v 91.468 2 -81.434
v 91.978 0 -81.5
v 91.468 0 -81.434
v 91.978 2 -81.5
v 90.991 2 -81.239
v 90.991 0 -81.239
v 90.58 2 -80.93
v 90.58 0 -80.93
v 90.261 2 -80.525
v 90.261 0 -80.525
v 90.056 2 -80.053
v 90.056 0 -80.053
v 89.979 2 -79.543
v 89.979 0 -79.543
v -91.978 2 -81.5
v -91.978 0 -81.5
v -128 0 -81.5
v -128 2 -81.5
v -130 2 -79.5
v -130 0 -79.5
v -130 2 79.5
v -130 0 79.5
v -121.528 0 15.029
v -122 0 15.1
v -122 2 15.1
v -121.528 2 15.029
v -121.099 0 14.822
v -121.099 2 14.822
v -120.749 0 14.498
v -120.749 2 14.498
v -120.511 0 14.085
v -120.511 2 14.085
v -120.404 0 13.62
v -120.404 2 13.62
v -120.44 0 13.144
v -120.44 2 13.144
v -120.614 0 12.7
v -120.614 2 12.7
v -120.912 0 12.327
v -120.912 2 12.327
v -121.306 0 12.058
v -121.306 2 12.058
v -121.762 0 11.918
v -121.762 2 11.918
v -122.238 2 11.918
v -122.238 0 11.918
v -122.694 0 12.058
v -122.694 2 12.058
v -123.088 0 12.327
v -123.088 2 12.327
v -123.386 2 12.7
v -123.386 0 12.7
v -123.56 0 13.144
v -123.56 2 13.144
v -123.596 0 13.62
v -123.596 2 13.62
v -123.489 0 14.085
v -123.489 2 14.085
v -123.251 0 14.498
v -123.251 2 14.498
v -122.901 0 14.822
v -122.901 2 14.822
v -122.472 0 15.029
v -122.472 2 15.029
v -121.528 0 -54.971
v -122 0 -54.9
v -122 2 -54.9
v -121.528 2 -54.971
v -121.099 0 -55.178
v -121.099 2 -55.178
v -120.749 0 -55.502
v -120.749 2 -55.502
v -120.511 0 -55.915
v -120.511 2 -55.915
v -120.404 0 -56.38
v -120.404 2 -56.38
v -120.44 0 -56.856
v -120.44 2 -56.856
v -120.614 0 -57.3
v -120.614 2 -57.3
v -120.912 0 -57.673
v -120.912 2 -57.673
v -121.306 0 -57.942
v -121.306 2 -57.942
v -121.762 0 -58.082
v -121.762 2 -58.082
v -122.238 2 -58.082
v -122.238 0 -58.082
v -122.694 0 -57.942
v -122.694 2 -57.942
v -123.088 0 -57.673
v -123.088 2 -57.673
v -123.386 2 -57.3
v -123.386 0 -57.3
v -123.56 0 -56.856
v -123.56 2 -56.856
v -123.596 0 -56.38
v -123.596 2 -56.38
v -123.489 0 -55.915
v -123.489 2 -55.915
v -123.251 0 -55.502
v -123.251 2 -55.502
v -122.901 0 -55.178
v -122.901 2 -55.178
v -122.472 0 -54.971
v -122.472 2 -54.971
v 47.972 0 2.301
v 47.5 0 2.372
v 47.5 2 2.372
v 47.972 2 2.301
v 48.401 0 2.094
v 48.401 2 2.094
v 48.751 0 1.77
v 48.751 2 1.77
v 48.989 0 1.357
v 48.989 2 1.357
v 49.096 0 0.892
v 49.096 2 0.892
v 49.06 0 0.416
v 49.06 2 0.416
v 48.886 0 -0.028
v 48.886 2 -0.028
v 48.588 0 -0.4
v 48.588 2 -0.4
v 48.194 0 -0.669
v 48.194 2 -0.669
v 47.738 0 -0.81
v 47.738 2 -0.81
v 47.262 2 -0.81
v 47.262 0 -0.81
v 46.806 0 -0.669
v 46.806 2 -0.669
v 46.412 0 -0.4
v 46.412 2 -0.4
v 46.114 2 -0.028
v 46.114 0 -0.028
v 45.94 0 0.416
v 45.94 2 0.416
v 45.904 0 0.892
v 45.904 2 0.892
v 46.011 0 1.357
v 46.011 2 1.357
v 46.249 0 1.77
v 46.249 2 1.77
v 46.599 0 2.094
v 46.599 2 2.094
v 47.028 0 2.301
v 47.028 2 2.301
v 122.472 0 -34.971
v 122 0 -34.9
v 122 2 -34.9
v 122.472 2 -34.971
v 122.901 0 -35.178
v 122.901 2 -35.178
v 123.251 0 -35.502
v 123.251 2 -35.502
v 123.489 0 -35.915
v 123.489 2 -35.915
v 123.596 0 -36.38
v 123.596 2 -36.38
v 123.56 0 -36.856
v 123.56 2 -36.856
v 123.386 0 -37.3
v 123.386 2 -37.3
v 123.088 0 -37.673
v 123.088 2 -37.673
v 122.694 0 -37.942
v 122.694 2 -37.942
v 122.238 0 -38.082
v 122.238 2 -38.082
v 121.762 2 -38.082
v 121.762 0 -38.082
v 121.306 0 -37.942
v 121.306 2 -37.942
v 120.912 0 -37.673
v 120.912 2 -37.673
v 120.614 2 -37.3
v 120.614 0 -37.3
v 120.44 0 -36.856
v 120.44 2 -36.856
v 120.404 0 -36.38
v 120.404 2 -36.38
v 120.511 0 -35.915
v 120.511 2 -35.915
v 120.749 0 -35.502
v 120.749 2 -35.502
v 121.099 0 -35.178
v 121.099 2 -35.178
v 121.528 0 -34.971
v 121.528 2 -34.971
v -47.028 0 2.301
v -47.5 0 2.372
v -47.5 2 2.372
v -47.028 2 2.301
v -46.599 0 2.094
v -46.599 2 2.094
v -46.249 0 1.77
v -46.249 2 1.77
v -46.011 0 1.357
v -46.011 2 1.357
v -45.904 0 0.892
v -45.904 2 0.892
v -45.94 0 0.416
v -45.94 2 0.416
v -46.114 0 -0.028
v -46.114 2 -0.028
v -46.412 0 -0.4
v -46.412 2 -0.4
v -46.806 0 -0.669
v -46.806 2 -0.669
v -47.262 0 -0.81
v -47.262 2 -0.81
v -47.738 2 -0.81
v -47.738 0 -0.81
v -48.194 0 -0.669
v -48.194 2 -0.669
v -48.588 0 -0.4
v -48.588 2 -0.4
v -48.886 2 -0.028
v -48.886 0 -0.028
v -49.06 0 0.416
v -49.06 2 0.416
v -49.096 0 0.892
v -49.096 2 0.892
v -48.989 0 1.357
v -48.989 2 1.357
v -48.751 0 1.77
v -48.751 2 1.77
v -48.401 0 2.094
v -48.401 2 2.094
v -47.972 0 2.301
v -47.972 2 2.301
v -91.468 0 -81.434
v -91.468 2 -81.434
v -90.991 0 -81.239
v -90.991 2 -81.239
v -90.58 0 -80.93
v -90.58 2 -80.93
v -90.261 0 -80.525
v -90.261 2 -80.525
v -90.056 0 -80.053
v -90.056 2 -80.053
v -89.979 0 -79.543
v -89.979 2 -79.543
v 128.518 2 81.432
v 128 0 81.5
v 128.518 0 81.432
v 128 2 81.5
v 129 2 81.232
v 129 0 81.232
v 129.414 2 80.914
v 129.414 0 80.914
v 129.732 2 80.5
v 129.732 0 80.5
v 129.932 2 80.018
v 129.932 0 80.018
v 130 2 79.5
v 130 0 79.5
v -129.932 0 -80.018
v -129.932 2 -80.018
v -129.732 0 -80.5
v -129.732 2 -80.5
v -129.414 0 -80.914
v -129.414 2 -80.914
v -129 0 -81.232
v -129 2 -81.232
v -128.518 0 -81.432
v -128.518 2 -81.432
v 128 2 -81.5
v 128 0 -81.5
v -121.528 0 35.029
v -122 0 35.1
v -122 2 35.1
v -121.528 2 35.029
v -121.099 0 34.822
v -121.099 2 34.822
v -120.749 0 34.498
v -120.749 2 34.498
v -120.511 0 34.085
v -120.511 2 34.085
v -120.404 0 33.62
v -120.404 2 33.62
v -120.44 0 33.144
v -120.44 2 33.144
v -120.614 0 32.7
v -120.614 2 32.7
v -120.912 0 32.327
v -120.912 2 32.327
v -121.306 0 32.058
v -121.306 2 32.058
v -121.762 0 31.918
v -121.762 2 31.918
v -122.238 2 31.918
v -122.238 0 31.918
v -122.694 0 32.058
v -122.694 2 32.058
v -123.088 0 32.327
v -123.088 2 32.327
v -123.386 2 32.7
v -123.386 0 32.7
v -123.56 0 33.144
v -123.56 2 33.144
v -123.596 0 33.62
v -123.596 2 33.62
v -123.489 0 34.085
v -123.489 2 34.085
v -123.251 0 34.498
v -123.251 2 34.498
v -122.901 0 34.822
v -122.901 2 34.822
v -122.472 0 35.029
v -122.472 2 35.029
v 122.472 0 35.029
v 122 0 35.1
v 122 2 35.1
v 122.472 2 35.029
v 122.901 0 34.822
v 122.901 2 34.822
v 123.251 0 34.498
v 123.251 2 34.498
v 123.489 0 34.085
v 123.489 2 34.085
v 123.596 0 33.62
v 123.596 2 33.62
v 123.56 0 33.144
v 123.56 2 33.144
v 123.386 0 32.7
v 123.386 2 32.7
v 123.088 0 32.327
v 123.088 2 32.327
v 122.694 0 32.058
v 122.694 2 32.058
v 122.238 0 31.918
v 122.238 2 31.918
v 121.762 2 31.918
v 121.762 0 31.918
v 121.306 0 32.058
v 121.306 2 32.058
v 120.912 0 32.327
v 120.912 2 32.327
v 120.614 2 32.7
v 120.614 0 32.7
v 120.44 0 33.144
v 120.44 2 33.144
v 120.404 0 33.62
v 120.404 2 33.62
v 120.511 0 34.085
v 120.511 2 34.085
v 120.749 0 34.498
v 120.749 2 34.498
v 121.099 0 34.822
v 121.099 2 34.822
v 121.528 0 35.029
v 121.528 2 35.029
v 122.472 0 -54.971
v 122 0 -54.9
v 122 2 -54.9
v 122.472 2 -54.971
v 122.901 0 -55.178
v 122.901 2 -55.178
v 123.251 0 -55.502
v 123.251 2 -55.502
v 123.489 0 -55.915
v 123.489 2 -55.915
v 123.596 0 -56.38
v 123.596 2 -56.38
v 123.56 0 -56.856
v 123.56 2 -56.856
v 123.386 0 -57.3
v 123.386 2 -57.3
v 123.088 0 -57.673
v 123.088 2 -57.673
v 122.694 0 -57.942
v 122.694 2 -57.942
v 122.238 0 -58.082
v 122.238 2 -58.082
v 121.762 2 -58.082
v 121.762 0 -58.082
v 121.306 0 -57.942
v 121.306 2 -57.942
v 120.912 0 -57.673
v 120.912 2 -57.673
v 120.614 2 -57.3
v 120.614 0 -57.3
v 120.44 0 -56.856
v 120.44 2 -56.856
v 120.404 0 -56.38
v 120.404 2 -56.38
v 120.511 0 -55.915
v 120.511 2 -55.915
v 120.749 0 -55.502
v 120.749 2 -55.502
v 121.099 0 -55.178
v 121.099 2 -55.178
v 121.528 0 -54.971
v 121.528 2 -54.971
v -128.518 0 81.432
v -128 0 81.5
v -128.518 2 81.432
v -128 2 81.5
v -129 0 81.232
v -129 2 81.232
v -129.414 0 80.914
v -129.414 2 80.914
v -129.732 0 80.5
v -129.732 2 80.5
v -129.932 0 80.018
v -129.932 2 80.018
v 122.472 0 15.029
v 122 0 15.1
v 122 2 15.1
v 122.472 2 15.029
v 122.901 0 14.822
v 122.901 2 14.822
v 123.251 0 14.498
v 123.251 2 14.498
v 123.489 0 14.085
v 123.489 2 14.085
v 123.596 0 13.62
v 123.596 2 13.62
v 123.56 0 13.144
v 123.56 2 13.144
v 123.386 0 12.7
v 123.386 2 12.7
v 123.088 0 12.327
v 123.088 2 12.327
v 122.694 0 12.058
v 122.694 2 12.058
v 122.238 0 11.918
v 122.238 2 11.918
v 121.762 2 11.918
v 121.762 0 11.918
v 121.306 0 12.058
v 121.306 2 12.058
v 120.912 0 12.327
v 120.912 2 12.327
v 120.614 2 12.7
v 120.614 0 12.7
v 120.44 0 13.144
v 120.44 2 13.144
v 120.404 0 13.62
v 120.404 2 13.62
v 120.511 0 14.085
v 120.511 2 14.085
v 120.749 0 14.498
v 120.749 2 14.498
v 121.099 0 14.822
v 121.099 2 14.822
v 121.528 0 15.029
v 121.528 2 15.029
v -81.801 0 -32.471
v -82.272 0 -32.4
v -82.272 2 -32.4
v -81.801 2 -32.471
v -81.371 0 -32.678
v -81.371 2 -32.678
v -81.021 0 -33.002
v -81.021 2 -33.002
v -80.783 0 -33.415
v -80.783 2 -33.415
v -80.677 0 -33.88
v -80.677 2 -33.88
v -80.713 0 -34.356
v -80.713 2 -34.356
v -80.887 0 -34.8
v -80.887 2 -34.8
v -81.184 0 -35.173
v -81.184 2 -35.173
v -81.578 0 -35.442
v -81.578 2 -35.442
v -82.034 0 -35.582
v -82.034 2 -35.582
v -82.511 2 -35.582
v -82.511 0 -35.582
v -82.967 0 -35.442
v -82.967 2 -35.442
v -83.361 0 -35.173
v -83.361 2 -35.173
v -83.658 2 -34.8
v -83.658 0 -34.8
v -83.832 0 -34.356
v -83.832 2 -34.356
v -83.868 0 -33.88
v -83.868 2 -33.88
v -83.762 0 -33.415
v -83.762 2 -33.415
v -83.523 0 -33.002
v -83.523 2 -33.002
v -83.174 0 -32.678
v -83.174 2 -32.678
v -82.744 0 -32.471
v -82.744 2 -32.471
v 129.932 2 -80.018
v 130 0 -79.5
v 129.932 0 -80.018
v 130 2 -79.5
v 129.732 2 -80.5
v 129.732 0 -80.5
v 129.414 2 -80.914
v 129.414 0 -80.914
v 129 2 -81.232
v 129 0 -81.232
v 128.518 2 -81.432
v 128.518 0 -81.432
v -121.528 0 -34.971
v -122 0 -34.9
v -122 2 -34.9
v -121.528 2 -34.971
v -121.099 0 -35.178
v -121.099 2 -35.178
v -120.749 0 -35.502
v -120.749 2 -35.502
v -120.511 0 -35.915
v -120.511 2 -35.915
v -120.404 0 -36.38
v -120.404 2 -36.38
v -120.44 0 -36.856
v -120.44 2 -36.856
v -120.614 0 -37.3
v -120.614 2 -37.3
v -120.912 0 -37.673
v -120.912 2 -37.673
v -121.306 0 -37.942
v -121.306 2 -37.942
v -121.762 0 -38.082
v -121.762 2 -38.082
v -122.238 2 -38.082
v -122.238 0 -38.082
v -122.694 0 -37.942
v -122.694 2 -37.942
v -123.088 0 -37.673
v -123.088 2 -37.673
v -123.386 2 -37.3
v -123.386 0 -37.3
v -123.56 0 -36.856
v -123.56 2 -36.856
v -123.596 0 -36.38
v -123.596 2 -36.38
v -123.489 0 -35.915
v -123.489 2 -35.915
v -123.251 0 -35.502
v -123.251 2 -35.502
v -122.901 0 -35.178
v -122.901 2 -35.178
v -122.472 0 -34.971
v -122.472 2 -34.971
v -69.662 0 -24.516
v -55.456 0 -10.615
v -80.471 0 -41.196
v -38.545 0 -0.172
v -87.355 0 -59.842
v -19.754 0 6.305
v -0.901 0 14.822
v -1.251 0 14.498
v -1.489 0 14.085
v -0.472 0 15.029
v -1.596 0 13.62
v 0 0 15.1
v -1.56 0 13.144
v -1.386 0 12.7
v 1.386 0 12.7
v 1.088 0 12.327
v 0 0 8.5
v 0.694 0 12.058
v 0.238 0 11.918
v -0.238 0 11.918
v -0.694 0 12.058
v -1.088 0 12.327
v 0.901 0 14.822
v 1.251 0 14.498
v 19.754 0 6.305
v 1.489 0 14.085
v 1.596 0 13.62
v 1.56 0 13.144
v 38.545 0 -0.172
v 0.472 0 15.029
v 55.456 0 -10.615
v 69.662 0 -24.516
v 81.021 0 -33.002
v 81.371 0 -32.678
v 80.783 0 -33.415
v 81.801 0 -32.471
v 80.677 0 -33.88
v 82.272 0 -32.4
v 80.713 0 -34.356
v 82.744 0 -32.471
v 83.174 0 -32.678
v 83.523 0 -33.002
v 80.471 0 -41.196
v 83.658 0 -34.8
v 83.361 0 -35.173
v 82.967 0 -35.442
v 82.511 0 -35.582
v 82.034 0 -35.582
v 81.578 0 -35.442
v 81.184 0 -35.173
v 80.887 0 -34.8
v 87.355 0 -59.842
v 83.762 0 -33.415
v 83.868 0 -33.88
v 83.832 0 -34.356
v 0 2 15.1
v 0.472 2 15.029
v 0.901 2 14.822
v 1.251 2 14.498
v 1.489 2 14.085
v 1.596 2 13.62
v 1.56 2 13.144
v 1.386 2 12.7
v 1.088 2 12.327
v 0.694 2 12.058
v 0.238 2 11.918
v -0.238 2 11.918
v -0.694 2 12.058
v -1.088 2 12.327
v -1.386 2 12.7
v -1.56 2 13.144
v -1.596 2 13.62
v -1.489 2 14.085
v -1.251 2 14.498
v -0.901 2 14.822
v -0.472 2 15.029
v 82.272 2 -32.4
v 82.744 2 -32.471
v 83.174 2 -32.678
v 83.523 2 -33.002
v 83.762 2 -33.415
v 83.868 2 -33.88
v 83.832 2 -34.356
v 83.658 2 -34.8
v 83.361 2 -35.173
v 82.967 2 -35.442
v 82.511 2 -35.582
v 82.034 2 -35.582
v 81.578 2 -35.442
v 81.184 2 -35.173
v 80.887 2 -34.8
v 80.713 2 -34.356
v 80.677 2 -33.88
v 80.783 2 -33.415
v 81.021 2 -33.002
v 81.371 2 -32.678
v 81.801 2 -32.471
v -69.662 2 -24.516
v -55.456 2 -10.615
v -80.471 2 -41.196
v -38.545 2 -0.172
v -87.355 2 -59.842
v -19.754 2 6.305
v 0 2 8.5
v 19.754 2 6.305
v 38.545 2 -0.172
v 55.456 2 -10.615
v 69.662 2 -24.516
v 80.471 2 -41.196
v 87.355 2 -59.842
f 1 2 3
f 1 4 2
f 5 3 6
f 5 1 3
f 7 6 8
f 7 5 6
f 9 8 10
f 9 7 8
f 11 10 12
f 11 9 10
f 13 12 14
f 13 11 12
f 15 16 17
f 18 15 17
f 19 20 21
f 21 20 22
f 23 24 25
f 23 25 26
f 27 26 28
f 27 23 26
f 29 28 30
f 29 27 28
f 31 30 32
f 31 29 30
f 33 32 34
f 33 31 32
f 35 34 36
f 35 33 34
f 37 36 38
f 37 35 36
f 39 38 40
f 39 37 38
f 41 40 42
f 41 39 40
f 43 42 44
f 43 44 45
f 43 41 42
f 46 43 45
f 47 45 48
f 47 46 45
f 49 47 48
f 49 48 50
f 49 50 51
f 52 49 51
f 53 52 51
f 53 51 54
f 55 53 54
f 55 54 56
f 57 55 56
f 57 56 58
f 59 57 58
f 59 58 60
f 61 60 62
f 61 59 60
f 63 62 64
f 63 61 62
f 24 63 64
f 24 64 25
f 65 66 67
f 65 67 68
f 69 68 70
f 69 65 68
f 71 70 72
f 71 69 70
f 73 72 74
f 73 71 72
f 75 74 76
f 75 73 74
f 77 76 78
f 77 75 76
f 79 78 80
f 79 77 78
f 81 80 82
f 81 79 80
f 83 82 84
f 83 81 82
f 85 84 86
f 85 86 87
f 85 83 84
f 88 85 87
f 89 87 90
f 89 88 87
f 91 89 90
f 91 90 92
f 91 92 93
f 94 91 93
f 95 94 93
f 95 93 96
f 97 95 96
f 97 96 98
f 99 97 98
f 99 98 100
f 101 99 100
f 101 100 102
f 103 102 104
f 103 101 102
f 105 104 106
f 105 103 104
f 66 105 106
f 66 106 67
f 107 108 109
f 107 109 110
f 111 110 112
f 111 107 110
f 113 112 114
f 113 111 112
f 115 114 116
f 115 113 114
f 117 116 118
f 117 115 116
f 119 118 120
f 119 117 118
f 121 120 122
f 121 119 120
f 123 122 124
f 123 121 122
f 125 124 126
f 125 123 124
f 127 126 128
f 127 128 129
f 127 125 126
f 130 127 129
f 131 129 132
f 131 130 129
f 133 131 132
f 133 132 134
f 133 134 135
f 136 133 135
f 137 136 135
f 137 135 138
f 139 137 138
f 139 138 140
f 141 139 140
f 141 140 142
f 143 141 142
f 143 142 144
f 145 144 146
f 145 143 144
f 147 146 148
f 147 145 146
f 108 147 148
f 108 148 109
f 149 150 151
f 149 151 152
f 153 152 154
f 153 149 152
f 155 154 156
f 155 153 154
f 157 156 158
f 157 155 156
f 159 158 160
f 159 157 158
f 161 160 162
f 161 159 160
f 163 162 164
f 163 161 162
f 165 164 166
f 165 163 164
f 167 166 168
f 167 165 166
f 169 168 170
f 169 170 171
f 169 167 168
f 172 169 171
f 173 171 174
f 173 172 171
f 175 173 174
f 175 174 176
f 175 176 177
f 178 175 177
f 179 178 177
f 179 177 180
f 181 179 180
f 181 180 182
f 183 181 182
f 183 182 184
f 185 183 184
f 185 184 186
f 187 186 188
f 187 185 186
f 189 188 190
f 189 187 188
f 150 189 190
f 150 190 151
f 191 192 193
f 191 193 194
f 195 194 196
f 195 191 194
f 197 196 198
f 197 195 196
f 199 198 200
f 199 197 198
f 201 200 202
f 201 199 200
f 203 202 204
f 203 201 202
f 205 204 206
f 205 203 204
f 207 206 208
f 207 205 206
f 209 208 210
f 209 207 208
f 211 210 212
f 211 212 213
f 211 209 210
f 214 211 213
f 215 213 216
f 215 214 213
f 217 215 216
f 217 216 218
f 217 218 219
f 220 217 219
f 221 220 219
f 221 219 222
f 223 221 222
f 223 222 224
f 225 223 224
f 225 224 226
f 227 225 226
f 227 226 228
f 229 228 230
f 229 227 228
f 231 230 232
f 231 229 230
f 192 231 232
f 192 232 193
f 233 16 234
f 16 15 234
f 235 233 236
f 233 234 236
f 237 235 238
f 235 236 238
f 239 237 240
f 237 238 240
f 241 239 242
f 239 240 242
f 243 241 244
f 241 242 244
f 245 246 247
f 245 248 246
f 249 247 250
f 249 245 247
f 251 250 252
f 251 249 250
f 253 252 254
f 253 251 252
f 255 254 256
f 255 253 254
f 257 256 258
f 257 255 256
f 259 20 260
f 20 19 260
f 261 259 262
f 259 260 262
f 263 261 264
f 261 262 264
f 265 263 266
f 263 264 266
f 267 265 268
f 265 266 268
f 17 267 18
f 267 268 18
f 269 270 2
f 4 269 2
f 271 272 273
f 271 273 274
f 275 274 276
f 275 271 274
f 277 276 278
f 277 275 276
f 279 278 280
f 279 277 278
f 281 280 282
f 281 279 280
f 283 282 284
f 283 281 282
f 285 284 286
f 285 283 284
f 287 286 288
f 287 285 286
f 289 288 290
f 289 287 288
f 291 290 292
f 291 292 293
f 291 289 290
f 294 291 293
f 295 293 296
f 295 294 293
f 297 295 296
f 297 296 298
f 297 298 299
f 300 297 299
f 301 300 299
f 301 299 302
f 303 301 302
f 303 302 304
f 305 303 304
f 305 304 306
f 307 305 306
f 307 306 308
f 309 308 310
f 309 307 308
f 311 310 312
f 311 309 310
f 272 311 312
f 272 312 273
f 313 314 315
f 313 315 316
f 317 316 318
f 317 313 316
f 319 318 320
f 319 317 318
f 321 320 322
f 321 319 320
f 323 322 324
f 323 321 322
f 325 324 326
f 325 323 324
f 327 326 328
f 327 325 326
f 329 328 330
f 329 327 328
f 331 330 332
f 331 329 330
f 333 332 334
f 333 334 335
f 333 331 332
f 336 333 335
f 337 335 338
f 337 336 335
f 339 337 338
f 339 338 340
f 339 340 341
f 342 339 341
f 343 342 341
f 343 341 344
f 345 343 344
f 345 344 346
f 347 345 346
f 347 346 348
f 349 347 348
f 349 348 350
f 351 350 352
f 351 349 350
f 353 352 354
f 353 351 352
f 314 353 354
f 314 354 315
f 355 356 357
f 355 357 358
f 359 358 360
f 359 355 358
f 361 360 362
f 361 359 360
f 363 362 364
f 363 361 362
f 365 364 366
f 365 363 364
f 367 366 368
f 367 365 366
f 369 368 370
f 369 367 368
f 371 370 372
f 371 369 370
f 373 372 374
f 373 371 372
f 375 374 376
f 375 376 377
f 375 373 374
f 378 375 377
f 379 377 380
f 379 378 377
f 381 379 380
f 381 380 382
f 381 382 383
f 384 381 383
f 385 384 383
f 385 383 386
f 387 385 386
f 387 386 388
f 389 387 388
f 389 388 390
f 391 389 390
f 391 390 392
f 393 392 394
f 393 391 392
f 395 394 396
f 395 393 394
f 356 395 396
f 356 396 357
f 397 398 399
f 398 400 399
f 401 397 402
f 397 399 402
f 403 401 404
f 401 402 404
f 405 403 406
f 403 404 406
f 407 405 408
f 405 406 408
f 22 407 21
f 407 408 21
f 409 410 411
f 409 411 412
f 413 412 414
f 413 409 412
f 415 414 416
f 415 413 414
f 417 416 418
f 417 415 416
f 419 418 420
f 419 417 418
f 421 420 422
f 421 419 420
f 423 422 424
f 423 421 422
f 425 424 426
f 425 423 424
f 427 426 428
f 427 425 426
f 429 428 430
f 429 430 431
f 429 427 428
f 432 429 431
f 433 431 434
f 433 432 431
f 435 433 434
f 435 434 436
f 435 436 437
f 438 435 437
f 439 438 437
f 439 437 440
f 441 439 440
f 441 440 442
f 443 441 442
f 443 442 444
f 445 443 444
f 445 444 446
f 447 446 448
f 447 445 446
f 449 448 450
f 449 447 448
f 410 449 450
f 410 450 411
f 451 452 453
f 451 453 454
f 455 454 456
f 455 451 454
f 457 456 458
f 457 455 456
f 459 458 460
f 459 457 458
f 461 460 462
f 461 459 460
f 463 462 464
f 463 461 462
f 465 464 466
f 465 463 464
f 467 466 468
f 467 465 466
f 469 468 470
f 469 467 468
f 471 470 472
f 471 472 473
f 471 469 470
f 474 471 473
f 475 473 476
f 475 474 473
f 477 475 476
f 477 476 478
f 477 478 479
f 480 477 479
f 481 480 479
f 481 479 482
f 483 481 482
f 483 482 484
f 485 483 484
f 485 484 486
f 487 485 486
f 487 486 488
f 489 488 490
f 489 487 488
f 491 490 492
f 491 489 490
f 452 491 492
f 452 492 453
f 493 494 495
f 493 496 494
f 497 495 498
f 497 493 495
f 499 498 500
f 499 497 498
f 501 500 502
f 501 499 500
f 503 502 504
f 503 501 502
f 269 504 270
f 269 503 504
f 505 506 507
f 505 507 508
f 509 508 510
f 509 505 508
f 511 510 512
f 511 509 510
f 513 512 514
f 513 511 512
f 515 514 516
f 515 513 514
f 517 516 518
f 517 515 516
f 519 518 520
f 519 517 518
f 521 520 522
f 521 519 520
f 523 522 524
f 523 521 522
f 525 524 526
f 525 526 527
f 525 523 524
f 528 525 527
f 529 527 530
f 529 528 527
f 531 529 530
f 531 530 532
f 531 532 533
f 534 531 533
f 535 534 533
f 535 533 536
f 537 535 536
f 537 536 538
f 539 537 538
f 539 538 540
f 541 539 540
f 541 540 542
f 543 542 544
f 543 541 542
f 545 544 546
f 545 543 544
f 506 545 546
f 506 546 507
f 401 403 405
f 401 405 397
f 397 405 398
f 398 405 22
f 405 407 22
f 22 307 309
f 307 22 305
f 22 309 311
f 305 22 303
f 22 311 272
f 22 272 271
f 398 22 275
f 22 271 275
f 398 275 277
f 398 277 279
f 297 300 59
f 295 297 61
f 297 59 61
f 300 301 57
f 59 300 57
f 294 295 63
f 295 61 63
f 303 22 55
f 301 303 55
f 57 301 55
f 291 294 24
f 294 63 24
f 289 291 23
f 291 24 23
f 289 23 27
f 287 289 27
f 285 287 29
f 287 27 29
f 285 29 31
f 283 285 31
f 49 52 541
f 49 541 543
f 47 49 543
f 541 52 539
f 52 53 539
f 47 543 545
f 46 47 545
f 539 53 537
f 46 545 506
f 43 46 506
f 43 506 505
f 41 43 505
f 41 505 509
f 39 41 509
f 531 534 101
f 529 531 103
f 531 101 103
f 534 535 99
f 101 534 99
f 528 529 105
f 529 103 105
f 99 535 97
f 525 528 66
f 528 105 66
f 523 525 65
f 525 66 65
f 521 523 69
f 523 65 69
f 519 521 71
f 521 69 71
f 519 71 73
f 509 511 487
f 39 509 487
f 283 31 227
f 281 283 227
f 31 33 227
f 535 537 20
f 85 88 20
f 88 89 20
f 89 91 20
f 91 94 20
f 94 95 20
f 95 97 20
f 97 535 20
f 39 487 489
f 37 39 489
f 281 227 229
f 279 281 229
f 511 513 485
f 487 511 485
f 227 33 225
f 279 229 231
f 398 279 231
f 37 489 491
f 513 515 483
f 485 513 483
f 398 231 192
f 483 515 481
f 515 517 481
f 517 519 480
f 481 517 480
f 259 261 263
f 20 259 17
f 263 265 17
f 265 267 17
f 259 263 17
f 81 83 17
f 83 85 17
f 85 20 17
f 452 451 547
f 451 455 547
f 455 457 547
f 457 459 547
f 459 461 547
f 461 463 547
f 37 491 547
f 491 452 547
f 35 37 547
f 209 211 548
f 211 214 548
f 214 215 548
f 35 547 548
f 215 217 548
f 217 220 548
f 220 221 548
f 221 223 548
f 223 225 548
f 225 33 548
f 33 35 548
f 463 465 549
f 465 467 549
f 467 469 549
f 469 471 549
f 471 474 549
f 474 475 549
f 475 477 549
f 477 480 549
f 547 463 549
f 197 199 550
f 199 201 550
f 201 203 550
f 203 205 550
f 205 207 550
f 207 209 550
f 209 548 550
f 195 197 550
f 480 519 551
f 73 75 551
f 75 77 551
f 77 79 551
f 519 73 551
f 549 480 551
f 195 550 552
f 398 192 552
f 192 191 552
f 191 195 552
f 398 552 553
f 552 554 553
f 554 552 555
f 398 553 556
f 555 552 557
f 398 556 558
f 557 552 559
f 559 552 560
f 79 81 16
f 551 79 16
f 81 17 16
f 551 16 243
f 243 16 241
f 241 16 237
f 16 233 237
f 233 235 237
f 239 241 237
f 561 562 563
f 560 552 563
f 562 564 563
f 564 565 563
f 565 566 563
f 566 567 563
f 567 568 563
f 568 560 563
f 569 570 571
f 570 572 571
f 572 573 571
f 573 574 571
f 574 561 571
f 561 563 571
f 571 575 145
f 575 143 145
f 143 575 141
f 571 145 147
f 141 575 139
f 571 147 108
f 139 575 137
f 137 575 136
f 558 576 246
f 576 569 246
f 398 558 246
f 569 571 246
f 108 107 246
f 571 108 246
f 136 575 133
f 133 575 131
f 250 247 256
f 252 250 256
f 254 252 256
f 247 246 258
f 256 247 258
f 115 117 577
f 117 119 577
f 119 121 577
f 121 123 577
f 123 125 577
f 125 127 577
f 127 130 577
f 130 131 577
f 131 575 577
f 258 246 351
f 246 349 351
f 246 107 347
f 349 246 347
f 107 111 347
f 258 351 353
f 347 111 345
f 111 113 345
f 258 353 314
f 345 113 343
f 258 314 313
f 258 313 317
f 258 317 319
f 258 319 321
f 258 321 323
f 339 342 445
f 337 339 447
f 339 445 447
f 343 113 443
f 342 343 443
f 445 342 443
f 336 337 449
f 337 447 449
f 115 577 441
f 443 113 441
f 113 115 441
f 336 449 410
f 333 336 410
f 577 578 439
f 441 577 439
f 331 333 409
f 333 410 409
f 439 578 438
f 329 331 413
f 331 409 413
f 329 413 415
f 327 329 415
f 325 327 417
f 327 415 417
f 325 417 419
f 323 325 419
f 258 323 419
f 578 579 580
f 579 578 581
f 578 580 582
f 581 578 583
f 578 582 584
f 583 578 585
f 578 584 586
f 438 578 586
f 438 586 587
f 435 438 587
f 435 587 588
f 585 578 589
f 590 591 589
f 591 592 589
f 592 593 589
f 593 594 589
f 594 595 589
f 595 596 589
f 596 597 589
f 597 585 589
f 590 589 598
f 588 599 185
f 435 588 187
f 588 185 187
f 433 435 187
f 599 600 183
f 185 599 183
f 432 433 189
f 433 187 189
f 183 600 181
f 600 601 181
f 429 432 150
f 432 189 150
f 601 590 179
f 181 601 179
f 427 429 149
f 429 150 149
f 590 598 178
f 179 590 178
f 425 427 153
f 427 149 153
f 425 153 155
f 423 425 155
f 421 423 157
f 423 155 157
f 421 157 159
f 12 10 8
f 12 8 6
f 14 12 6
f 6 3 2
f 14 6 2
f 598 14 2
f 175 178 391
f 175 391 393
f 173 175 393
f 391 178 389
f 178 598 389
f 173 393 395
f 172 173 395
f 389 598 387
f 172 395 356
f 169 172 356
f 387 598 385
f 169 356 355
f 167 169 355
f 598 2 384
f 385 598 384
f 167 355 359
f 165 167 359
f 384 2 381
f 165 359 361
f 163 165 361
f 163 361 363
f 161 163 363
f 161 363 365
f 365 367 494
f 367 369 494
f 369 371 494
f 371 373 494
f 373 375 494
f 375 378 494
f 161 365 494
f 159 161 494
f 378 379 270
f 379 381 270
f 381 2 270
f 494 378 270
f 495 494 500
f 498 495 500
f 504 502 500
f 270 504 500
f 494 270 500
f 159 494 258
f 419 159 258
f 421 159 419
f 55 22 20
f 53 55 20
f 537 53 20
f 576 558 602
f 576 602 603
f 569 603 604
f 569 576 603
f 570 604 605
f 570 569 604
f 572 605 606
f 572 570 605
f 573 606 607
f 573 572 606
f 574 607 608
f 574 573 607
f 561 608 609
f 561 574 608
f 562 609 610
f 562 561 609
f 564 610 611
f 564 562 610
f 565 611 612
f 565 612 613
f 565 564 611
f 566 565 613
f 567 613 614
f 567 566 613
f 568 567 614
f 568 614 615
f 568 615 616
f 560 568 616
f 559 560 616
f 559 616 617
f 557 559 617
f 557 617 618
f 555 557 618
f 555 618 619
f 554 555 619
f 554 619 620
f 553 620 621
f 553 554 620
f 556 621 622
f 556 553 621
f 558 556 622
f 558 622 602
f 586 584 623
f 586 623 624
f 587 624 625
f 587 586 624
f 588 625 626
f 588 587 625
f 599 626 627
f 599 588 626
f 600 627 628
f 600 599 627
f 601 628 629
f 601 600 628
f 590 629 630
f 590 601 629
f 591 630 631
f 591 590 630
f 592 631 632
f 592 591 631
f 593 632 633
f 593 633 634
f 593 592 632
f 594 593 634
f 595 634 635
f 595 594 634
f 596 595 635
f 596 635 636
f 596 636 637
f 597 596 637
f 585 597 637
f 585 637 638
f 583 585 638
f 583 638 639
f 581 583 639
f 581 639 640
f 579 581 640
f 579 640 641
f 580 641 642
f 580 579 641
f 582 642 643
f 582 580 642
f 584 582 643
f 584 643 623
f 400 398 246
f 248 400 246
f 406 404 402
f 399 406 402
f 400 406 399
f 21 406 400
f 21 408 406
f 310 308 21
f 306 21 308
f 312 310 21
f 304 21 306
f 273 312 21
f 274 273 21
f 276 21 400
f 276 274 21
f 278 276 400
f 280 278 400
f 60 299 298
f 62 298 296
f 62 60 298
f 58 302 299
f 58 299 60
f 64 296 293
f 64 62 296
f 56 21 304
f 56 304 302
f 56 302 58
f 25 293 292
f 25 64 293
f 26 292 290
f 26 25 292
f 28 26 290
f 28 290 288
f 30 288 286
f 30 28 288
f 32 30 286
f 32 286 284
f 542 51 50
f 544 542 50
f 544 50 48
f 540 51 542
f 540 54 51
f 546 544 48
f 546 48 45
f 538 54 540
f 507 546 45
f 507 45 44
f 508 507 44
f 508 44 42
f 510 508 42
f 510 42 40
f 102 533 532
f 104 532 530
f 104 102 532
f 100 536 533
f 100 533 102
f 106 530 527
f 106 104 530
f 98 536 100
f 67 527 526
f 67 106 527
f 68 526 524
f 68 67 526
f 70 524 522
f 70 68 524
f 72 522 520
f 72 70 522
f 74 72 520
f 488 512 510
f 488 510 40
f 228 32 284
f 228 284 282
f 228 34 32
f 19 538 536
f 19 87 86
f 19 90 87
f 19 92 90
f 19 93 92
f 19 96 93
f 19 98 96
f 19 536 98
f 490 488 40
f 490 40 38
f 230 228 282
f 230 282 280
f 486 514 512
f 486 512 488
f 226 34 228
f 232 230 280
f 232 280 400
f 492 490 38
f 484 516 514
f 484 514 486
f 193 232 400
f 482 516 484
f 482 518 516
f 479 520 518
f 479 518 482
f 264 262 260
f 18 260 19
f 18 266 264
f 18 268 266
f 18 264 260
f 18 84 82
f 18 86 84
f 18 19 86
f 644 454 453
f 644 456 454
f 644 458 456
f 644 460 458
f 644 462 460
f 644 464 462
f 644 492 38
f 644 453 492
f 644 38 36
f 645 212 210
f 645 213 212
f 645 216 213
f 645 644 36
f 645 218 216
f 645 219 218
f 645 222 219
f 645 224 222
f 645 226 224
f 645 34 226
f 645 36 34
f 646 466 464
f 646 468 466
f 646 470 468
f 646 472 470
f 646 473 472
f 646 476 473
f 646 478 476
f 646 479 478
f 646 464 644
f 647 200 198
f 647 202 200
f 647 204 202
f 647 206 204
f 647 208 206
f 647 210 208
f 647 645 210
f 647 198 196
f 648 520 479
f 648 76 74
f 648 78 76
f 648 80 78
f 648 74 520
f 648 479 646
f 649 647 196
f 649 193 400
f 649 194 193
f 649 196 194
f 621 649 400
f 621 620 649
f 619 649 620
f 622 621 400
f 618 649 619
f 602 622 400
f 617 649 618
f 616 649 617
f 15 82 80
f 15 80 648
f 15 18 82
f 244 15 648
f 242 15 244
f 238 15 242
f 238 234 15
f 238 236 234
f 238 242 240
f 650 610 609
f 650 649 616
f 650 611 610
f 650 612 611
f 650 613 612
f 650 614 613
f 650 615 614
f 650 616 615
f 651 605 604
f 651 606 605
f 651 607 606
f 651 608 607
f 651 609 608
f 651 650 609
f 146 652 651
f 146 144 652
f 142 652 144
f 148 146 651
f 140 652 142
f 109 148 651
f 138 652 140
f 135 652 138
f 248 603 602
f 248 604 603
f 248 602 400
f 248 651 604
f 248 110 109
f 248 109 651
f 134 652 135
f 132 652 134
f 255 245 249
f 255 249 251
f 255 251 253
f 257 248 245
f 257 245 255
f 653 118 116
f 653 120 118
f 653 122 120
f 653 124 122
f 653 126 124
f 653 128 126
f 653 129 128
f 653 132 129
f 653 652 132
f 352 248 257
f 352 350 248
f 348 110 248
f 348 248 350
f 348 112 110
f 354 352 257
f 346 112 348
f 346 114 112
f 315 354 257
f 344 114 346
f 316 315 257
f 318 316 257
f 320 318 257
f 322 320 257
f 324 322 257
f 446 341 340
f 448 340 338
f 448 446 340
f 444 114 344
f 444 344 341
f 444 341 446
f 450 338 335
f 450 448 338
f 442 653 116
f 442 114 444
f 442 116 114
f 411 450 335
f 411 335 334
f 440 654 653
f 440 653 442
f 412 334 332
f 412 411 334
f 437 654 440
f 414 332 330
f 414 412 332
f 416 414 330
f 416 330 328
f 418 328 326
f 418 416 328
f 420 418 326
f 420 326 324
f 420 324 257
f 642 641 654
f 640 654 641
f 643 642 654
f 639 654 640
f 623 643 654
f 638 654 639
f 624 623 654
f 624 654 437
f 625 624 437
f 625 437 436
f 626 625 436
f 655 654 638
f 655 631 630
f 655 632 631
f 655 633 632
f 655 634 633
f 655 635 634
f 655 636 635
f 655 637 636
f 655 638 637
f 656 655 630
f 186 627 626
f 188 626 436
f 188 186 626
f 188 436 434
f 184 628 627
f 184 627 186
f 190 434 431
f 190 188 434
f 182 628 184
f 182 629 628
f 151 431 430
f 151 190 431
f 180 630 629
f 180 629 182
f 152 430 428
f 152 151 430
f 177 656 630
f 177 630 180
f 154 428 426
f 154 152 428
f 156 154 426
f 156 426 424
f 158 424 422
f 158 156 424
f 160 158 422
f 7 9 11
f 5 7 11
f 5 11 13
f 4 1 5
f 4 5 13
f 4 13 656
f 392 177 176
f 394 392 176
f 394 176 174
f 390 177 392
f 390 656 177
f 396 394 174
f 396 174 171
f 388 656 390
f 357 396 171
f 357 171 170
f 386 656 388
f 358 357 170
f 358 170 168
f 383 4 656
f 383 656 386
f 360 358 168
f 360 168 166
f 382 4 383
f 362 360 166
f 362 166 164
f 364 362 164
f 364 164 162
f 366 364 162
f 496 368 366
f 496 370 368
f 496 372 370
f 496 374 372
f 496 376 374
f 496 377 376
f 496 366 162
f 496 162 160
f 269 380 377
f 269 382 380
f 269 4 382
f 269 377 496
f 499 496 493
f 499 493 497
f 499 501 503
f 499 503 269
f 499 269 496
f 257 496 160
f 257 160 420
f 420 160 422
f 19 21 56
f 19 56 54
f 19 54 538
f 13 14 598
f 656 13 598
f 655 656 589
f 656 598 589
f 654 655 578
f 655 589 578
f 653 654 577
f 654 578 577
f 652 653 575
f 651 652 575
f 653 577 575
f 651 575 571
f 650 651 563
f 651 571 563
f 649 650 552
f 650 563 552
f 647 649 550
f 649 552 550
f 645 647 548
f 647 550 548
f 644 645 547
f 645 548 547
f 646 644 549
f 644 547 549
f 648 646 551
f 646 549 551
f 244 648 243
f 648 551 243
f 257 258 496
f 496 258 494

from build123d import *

# Parameters (mm, degrees)
SKETCH_1_R      = 1.6
EXTRUDE_1_DEPTH = 2
FILLET_1_R      = 2


with BuildPart() as part:
    # 草图1 → 凸台-拉伸1 (new body)
    with BuildSketch(Plane(origin=(0, 0, 0), x_dir=(1, 0, 0), z_dir=(0, 1, 0))):
        with BuildLine():
            Line((-130, -81.5), (130, -81.5))
            Line((130, -81.5), (130, 81.5))
            Line((130, 81.5), (90, 81.5))
            ThreePointArc((90, 81.5), (0, -8.5), (-90, 81.5))
            Line((-90, 81.5), (-130, 81.5))
            Line((-130, 81.5), (-130, -81.5))
        make_face()
        with Locations(Location((-122, -33.5, 0), (0, 0, 270))):
            Circle(SKETCH_1_R, mode=Mode.SUBTRACT)
        with Locations(Location((-122, -13.5, 0), (0, 0, 270))):
            Circle(SKETCH_1_R, mode=Mode.SUBTRACT)
        with Locations(Location((-122, 36.5, 0), (0, 0, 270))):
            Circle(SKETCH_1_R, mode=Mode.SUBTRACT)
        with Locations(Location((-82.27241336, 34, 0), (0, 0, 270))):
            Circle(SKETCH_1_R, mode=Mode.SUBTRACT)
        with Locations(Location((-47.5, -0.77241336, 0), (0, 0, 270))):
            Circle(SKETCH_1_R, mode=Mode.SUBTRACT)
        with Locations(Location((122, -33.5, 0), (0, 0, 270))):
            Circle(SKETCH_1_R, mode=Mode.SUBTRACT)
        with Locations(Location((0, -13.5, 0), (0, 0, 270))):
            Circle(SKETCH_1_R, mode=Mode.SUBTRACT)
        with Locations(Location((47.5, -0.77241336, 0), (0, 0, 270))):
            Circle(SKETCH_1_R, mode=Mode.SUBTRACT)
        with Locations(Location((122, -13.5, 0), (0, 0, 270))):
            Circle(SKETCH_1_R, mode=Mode.SUBTRACT)
        with Locations(Location((82.27241336, 34, 0), (0, 0, 270))):
            Circle(SKETCH_1_R, mode=Mode.SUBTRACT)
        with Locations(Location((122, 36.5, 0), (0, 0, 270))):
            Circle(SKETCH_1_R, mode=Mode.SUBTRACT)
        with Locations(Location((-122, 56.5, 0), (0, 0, 270))):
            Circle(SKETCH_1_R, mode=Mode.SUBTRACT)
        with Locations(Location((122, 56.5, 0), (0, 0, 270))):
            Circle(SKETCH_1_R, mode=Mode.SUBTRACT)
    extrude(amount=EXTRUDE_1_DEPTH)

    # 圆角1
    fillet_1_edges = [part.edges().sort_by_distance(p)[0] for p in [
        (90, 1, -81.5),
        (130, 1, -81.5),
        (130, 1, 81.5),
        (-130, 1, 81.5),
        (-130, 1, -81.5),
        (-90, 1, -81.5),
    ]]
    fillet(fillet_1_edges, radius=FILLET_1_R)


solid = part.part
